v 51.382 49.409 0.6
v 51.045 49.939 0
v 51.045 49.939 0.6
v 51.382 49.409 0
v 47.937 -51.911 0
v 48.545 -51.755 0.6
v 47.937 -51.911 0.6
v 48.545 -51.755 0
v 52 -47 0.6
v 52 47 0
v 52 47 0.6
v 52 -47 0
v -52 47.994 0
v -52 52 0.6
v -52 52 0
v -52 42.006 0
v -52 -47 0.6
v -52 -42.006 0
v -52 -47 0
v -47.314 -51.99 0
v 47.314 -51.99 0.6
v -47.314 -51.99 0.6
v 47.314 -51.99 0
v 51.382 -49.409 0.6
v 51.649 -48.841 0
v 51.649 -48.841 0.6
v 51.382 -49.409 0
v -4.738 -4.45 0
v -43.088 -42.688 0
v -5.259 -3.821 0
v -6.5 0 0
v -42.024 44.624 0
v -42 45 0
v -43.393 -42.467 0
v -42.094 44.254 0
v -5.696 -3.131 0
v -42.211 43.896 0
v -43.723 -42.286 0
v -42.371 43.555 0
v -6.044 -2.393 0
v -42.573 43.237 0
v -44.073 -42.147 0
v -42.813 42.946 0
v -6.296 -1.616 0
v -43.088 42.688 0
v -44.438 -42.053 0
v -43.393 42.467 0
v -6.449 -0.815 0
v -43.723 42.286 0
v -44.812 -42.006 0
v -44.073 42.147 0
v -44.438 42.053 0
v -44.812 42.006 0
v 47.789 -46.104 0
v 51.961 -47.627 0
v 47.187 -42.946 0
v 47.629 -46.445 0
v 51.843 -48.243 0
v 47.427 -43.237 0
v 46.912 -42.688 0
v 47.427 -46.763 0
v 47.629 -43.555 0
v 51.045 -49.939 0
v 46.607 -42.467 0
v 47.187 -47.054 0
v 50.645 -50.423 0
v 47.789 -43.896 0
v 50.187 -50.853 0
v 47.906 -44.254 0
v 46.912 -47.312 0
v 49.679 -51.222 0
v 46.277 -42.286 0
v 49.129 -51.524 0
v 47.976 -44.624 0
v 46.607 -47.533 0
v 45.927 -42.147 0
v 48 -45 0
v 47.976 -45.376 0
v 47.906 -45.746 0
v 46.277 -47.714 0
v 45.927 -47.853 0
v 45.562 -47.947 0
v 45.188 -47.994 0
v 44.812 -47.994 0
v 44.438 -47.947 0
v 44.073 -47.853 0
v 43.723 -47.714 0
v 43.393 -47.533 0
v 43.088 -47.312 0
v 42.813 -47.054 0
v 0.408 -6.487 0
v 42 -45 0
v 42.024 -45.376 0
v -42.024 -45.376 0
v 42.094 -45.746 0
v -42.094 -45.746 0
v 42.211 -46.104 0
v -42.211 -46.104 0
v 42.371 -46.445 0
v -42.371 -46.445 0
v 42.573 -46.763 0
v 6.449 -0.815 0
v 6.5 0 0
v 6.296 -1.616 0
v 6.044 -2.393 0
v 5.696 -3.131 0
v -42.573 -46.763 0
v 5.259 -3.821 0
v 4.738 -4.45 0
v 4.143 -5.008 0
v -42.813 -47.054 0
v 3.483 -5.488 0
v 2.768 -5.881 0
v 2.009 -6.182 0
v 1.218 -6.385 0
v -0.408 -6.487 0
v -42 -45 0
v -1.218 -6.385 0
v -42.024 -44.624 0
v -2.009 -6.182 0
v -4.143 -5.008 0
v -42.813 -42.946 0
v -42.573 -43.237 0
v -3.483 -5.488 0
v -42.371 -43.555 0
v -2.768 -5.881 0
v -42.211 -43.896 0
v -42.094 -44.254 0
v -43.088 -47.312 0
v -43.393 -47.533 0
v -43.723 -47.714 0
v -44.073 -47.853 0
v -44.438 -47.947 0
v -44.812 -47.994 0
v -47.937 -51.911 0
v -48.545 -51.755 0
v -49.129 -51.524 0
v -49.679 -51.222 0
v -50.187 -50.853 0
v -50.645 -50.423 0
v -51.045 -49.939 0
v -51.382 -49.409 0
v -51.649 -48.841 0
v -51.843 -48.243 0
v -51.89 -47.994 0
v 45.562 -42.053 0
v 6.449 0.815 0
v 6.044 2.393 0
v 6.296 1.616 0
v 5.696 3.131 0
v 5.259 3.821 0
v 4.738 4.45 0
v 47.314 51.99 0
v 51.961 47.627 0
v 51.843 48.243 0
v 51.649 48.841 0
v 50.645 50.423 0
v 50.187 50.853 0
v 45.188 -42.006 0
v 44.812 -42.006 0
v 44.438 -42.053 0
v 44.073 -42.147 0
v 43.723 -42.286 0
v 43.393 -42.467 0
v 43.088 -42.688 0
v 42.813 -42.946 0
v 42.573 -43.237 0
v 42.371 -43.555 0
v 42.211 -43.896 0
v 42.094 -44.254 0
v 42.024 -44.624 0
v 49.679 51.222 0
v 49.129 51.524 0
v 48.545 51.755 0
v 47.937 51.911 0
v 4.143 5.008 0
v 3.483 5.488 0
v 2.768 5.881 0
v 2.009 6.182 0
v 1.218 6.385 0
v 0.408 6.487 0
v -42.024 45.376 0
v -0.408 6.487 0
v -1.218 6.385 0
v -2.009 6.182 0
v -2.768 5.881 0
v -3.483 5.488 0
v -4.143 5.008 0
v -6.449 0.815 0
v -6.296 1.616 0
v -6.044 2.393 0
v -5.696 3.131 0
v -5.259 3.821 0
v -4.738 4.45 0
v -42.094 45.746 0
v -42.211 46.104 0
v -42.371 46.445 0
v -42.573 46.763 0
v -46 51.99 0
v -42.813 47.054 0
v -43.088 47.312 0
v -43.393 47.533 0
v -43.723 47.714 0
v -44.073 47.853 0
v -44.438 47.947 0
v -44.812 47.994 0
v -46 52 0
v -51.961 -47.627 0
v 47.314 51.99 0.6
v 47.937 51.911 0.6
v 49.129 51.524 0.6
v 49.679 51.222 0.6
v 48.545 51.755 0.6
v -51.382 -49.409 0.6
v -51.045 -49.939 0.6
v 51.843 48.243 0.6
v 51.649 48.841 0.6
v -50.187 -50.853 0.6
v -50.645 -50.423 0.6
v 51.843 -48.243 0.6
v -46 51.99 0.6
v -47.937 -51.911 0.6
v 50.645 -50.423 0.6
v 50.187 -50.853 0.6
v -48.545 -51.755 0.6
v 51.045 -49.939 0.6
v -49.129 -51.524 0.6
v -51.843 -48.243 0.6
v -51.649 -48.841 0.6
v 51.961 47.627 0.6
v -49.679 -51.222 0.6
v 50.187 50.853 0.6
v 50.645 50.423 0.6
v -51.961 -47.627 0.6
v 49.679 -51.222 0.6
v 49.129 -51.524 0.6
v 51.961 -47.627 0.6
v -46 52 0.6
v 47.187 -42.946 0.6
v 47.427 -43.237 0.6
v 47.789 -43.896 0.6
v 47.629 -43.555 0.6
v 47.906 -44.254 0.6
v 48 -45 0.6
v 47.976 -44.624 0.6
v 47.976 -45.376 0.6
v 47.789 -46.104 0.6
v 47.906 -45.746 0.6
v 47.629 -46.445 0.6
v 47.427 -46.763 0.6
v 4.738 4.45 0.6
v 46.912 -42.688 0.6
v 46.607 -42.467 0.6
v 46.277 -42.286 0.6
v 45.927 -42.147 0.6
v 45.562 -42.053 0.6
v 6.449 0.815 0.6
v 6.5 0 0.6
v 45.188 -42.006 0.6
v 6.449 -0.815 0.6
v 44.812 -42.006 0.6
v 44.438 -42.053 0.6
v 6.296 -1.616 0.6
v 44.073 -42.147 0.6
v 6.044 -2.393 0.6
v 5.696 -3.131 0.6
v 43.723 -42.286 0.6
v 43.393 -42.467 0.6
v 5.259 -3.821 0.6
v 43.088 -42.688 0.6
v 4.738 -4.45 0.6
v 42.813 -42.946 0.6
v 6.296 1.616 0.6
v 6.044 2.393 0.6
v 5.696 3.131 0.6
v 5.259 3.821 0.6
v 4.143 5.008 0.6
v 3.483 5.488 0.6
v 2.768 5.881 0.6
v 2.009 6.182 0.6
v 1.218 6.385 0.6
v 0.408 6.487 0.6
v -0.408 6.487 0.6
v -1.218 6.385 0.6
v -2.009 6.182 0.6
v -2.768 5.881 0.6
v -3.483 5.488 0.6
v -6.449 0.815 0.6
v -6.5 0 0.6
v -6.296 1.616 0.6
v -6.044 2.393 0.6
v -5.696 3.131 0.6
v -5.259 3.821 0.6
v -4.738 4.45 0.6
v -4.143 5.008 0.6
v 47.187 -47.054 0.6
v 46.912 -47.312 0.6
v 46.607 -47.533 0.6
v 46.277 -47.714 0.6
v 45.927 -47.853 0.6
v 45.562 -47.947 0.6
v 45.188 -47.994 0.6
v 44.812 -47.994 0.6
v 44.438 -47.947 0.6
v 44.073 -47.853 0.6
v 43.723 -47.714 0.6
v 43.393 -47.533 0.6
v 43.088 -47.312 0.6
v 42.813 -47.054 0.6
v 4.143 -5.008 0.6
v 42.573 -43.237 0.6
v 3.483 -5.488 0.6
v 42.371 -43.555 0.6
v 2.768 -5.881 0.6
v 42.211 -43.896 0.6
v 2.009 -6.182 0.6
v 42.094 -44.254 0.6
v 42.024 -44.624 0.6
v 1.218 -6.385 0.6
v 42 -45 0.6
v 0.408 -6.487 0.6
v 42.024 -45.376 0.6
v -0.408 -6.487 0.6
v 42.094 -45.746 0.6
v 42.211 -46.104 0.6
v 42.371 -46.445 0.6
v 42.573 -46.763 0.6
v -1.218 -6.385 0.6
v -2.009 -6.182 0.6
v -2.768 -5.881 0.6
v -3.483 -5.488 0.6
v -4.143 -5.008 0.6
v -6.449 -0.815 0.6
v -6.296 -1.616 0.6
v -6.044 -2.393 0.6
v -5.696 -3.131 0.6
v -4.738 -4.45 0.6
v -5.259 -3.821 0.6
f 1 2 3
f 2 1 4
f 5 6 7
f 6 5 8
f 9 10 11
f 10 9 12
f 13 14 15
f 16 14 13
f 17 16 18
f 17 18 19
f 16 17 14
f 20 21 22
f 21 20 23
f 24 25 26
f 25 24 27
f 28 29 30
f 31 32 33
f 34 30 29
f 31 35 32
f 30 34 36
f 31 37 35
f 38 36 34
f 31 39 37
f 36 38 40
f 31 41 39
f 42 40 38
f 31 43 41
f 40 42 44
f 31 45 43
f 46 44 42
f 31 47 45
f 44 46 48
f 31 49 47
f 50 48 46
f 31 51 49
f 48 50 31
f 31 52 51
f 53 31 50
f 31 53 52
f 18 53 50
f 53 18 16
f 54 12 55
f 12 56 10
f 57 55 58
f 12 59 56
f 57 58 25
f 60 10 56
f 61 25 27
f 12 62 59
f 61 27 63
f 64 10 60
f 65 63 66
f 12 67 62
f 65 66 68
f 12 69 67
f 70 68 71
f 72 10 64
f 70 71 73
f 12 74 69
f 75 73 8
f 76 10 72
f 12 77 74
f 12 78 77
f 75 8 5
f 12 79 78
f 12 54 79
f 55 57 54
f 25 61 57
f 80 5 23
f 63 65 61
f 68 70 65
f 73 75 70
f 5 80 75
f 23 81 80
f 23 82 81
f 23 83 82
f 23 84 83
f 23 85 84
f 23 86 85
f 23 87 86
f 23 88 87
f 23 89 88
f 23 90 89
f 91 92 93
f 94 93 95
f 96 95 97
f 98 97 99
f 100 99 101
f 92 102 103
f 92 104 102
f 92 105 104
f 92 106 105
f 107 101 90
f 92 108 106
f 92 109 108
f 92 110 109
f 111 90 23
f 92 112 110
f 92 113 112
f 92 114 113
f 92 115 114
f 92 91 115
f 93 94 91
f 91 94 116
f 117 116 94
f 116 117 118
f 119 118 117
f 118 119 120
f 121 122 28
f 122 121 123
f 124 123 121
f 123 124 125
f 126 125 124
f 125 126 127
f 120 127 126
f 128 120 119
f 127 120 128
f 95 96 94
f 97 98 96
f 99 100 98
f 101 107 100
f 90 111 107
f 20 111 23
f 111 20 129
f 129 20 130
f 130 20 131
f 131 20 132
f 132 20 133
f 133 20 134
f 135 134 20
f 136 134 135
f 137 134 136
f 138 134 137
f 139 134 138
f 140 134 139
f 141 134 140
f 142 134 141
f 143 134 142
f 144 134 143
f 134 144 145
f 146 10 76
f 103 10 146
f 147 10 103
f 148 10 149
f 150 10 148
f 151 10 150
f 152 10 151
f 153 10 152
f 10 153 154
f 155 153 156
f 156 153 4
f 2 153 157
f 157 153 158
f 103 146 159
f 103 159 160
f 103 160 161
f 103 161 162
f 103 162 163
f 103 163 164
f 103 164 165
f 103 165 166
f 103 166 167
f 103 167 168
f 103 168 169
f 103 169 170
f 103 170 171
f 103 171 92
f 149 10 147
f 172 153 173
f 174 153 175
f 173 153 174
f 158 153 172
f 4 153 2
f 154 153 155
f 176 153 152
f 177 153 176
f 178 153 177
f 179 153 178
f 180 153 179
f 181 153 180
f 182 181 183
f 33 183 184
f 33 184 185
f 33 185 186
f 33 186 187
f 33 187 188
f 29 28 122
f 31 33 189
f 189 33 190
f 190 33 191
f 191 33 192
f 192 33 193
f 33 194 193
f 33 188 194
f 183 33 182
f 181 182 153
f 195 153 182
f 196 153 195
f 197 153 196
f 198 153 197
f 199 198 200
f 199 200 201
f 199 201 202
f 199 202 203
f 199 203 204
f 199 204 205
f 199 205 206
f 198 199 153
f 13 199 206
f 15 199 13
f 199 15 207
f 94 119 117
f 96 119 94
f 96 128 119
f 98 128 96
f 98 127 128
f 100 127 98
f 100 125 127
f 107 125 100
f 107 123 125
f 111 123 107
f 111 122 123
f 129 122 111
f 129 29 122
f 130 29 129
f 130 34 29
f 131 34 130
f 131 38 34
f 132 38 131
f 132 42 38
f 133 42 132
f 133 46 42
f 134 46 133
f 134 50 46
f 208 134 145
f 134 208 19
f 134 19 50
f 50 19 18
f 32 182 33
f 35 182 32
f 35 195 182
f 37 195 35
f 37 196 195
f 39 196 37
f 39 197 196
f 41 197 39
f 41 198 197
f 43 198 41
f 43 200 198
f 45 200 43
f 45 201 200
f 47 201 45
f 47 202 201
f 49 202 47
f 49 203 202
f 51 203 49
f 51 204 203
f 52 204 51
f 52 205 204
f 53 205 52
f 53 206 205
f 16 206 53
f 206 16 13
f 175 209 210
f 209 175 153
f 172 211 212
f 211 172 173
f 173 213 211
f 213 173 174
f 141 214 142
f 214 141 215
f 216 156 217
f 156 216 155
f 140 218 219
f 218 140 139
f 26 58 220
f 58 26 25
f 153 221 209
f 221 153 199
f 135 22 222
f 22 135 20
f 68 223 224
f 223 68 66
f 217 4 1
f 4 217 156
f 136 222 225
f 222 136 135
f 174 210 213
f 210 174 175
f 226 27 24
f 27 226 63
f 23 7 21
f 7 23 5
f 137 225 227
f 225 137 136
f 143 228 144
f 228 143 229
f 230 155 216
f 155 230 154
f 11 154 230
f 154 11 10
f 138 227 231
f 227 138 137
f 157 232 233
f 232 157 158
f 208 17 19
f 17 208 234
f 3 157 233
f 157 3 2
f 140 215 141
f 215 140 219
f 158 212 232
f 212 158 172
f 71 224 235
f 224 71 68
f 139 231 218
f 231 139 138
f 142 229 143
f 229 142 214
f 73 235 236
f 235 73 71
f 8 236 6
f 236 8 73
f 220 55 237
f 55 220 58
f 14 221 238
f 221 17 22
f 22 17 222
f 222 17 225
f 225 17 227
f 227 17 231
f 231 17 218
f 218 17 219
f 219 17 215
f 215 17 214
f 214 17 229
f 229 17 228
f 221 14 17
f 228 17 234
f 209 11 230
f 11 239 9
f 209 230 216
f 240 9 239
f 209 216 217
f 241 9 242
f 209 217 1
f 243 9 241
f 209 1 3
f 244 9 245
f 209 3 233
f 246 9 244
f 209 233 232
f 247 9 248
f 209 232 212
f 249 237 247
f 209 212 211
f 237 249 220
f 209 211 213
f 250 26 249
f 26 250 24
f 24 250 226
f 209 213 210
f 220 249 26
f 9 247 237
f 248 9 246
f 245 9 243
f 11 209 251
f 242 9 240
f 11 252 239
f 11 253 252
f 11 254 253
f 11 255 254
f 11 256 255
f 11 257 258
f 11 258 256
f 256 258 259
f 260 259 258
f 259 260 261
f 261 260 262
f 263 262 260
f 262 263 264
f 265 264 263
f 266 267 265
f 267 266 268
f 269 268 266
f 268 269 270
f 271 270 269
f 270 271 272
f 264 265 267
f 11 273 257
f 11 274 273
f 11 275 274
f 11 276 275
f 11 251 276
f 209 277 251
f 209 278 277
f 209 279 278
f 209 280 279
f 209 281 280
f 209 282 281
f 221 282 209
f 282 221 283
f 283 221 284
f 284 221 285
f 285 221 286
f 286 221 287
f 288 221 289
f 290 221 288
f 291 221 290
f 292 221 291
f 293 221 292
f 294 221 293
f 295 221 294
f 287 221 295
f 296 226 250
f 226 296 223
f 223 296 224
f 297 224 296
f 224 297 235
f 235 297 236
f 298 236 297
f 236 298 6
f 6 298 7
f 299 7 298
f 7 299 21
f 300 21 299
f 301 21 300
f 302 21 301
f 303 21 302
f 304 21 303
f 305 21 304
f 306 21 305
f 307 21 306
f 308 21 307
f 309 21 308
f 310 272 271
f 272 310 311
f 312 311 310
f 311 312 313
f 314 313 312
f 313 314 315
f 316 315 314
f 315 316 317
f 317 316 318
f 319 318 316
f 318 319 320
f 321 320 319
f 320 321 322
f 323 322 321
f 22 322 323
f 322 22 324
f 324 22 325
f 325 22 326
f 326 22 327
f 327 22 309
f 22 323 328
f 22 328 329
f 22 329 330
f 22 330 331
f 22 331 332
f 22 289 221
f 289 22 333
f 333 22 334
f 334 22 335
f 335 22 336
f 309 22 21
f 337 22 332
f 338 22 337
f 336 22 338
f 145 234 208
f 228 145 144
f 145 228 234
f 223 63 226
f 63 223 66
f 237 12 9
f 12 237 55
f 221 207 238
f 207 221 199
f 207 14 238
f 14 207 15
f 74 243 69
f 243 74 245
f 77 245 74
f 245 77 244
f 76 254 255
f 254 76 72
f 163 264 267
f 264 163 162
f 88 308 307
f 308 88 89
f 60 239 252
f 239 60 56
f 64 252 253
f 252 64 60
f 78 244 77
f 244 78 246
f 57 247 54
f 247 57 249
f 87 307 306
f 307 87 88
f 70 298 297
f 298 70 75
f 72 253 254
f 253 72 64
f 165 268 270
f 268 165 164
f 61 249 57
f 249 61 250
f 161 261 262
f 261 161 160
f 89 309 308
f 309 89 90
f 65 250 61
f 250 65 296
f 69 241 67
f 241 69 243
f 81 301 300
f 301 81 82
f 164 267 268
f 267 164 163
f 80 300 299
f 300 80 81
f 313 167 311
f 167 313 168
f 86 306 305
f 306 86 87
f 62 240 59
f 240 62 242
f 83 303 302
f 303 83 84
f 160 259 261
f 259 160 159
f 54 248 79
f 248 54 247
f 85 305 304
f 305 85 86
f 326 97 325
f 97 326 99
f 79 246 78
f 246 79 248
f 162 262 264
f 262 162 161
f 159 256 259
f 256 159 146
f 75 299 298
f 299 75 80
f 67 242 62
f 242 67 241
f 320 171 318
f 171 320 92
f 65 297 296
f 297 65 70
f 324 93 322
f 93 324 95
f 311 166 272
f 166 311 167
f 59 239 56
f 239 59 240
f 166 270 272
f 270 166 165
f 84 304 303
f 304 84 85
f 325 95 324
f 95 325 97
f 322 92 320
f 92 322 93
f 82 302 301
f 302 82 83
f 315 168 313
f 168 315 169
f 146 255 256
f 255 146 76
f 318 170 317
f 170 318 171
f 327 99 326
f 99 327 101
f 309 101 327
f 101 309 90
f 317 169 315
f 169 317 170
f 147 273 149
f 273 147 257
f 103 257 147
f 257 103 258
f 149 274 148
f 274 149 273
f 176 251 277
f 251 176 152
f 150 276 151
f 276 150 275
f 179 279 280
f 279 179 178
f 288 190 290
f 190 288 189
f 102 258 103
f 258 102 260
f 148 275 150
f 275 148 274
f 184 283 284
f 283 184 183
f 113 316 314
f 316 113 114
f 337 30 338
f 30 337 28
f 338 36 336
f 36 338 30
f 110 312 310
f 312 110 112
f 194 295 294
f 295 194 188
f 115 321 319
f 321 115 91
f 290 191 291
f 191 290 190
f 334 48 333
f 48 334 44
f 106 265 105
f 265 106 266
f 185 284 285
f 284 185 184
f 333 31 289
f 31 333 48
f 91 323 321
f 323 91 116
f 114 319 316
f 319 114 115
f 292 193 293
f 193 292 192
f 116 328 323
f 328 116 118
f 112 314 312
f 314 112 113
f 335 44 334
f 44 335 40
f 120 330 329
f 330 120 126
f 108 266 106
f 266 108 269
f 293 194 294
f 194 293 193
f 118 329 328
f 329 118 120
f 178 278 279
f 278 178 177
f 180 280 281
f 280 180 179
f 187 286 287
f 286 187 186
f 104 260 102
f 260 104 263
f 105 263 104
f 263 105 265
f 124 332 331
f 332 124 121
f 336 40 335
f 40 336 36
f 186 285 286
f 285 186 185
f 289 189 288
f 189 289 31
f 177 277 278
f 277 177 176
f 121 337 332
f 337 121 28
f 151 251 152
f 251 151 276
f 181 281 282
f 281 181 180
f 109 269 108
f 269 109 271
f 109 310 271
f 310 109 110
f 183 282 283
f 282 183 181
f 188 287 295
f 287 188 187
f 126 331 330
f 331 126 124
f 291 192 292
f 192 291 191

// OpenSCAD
$fn = 50;


difference() {
	union() {
		hull() {
			translate(v = [-47.0000000000, 47.0000000000, 0]) {
				cylinder(h = 0.6000000000, r = 5);
			}
			translate(v = [47.0000000000, 47.0000000000, 0]) {
				cylinder(h = 0.6000000000, r = 5);
			}
			translate(v = [-47.0000000000, -47.0000000000, 0]) {
				cylinder(h = 0.6000000000, r = 5);
			}
			translate(v = [47.0000000000, -47.0000000000, 0]) {
				cylinder(h = 0.6000000000, r = 5);
			}
		}
		translate(v = [-52.0000000000, 46.0000000000, 0]) {
			cube(size = [6, 6, 0.6000000000]);
		}
	}
	union() {
		translate(v = [-52.5000000000, -45.0000000000, -250.0000000000]) {
			rotate(a = [0, 0, 0]) {
				difference() {
					union() {
						hull() {
							translate(v = [7.5000000000, 0, 0]) {
								cylinder(h = 250, r = 3.0000000000, r1 = 3.0000000000, r2 = 3.0000000000);
							}
							translate(v = [-7.5000000000, 0, 0]) {
								cylinder(h = 250, r = 3.0000000000, r1 = 3.0000000000, r2 = 3.0000000000);
							}
						}
					}
					union();
				}
			}
		}
		translate(v = [-52.5000000000, 45.0000000000, -250.0000000000]) {
			rotate(a = [0, 0, 0]) {
				difference() {
					union() {
						hull() {
							translate(v = [7.5000000000, 0, 0]) {
								cylinder(h = 250, r = 3.0000000000, r1 = 3.0000000000, r2 = 3.0000000000);
							}
							translate(v = [-7.5000000000, 0, 0]) {
								cylinder(h = 250, r = 3.0000000000, r1 = 3.0000000000, r2 = 3.0000000000);
							}
						}
					}
					union();
				}
			}
		}
		translate(v = [45.0000000000, -45.0000000000, 0]) {
			cylinder(h = 100, r = 3.0000000000);
		}
		cylinder(h = 0.6000000000, r = 6.5000000000);
	}
}
